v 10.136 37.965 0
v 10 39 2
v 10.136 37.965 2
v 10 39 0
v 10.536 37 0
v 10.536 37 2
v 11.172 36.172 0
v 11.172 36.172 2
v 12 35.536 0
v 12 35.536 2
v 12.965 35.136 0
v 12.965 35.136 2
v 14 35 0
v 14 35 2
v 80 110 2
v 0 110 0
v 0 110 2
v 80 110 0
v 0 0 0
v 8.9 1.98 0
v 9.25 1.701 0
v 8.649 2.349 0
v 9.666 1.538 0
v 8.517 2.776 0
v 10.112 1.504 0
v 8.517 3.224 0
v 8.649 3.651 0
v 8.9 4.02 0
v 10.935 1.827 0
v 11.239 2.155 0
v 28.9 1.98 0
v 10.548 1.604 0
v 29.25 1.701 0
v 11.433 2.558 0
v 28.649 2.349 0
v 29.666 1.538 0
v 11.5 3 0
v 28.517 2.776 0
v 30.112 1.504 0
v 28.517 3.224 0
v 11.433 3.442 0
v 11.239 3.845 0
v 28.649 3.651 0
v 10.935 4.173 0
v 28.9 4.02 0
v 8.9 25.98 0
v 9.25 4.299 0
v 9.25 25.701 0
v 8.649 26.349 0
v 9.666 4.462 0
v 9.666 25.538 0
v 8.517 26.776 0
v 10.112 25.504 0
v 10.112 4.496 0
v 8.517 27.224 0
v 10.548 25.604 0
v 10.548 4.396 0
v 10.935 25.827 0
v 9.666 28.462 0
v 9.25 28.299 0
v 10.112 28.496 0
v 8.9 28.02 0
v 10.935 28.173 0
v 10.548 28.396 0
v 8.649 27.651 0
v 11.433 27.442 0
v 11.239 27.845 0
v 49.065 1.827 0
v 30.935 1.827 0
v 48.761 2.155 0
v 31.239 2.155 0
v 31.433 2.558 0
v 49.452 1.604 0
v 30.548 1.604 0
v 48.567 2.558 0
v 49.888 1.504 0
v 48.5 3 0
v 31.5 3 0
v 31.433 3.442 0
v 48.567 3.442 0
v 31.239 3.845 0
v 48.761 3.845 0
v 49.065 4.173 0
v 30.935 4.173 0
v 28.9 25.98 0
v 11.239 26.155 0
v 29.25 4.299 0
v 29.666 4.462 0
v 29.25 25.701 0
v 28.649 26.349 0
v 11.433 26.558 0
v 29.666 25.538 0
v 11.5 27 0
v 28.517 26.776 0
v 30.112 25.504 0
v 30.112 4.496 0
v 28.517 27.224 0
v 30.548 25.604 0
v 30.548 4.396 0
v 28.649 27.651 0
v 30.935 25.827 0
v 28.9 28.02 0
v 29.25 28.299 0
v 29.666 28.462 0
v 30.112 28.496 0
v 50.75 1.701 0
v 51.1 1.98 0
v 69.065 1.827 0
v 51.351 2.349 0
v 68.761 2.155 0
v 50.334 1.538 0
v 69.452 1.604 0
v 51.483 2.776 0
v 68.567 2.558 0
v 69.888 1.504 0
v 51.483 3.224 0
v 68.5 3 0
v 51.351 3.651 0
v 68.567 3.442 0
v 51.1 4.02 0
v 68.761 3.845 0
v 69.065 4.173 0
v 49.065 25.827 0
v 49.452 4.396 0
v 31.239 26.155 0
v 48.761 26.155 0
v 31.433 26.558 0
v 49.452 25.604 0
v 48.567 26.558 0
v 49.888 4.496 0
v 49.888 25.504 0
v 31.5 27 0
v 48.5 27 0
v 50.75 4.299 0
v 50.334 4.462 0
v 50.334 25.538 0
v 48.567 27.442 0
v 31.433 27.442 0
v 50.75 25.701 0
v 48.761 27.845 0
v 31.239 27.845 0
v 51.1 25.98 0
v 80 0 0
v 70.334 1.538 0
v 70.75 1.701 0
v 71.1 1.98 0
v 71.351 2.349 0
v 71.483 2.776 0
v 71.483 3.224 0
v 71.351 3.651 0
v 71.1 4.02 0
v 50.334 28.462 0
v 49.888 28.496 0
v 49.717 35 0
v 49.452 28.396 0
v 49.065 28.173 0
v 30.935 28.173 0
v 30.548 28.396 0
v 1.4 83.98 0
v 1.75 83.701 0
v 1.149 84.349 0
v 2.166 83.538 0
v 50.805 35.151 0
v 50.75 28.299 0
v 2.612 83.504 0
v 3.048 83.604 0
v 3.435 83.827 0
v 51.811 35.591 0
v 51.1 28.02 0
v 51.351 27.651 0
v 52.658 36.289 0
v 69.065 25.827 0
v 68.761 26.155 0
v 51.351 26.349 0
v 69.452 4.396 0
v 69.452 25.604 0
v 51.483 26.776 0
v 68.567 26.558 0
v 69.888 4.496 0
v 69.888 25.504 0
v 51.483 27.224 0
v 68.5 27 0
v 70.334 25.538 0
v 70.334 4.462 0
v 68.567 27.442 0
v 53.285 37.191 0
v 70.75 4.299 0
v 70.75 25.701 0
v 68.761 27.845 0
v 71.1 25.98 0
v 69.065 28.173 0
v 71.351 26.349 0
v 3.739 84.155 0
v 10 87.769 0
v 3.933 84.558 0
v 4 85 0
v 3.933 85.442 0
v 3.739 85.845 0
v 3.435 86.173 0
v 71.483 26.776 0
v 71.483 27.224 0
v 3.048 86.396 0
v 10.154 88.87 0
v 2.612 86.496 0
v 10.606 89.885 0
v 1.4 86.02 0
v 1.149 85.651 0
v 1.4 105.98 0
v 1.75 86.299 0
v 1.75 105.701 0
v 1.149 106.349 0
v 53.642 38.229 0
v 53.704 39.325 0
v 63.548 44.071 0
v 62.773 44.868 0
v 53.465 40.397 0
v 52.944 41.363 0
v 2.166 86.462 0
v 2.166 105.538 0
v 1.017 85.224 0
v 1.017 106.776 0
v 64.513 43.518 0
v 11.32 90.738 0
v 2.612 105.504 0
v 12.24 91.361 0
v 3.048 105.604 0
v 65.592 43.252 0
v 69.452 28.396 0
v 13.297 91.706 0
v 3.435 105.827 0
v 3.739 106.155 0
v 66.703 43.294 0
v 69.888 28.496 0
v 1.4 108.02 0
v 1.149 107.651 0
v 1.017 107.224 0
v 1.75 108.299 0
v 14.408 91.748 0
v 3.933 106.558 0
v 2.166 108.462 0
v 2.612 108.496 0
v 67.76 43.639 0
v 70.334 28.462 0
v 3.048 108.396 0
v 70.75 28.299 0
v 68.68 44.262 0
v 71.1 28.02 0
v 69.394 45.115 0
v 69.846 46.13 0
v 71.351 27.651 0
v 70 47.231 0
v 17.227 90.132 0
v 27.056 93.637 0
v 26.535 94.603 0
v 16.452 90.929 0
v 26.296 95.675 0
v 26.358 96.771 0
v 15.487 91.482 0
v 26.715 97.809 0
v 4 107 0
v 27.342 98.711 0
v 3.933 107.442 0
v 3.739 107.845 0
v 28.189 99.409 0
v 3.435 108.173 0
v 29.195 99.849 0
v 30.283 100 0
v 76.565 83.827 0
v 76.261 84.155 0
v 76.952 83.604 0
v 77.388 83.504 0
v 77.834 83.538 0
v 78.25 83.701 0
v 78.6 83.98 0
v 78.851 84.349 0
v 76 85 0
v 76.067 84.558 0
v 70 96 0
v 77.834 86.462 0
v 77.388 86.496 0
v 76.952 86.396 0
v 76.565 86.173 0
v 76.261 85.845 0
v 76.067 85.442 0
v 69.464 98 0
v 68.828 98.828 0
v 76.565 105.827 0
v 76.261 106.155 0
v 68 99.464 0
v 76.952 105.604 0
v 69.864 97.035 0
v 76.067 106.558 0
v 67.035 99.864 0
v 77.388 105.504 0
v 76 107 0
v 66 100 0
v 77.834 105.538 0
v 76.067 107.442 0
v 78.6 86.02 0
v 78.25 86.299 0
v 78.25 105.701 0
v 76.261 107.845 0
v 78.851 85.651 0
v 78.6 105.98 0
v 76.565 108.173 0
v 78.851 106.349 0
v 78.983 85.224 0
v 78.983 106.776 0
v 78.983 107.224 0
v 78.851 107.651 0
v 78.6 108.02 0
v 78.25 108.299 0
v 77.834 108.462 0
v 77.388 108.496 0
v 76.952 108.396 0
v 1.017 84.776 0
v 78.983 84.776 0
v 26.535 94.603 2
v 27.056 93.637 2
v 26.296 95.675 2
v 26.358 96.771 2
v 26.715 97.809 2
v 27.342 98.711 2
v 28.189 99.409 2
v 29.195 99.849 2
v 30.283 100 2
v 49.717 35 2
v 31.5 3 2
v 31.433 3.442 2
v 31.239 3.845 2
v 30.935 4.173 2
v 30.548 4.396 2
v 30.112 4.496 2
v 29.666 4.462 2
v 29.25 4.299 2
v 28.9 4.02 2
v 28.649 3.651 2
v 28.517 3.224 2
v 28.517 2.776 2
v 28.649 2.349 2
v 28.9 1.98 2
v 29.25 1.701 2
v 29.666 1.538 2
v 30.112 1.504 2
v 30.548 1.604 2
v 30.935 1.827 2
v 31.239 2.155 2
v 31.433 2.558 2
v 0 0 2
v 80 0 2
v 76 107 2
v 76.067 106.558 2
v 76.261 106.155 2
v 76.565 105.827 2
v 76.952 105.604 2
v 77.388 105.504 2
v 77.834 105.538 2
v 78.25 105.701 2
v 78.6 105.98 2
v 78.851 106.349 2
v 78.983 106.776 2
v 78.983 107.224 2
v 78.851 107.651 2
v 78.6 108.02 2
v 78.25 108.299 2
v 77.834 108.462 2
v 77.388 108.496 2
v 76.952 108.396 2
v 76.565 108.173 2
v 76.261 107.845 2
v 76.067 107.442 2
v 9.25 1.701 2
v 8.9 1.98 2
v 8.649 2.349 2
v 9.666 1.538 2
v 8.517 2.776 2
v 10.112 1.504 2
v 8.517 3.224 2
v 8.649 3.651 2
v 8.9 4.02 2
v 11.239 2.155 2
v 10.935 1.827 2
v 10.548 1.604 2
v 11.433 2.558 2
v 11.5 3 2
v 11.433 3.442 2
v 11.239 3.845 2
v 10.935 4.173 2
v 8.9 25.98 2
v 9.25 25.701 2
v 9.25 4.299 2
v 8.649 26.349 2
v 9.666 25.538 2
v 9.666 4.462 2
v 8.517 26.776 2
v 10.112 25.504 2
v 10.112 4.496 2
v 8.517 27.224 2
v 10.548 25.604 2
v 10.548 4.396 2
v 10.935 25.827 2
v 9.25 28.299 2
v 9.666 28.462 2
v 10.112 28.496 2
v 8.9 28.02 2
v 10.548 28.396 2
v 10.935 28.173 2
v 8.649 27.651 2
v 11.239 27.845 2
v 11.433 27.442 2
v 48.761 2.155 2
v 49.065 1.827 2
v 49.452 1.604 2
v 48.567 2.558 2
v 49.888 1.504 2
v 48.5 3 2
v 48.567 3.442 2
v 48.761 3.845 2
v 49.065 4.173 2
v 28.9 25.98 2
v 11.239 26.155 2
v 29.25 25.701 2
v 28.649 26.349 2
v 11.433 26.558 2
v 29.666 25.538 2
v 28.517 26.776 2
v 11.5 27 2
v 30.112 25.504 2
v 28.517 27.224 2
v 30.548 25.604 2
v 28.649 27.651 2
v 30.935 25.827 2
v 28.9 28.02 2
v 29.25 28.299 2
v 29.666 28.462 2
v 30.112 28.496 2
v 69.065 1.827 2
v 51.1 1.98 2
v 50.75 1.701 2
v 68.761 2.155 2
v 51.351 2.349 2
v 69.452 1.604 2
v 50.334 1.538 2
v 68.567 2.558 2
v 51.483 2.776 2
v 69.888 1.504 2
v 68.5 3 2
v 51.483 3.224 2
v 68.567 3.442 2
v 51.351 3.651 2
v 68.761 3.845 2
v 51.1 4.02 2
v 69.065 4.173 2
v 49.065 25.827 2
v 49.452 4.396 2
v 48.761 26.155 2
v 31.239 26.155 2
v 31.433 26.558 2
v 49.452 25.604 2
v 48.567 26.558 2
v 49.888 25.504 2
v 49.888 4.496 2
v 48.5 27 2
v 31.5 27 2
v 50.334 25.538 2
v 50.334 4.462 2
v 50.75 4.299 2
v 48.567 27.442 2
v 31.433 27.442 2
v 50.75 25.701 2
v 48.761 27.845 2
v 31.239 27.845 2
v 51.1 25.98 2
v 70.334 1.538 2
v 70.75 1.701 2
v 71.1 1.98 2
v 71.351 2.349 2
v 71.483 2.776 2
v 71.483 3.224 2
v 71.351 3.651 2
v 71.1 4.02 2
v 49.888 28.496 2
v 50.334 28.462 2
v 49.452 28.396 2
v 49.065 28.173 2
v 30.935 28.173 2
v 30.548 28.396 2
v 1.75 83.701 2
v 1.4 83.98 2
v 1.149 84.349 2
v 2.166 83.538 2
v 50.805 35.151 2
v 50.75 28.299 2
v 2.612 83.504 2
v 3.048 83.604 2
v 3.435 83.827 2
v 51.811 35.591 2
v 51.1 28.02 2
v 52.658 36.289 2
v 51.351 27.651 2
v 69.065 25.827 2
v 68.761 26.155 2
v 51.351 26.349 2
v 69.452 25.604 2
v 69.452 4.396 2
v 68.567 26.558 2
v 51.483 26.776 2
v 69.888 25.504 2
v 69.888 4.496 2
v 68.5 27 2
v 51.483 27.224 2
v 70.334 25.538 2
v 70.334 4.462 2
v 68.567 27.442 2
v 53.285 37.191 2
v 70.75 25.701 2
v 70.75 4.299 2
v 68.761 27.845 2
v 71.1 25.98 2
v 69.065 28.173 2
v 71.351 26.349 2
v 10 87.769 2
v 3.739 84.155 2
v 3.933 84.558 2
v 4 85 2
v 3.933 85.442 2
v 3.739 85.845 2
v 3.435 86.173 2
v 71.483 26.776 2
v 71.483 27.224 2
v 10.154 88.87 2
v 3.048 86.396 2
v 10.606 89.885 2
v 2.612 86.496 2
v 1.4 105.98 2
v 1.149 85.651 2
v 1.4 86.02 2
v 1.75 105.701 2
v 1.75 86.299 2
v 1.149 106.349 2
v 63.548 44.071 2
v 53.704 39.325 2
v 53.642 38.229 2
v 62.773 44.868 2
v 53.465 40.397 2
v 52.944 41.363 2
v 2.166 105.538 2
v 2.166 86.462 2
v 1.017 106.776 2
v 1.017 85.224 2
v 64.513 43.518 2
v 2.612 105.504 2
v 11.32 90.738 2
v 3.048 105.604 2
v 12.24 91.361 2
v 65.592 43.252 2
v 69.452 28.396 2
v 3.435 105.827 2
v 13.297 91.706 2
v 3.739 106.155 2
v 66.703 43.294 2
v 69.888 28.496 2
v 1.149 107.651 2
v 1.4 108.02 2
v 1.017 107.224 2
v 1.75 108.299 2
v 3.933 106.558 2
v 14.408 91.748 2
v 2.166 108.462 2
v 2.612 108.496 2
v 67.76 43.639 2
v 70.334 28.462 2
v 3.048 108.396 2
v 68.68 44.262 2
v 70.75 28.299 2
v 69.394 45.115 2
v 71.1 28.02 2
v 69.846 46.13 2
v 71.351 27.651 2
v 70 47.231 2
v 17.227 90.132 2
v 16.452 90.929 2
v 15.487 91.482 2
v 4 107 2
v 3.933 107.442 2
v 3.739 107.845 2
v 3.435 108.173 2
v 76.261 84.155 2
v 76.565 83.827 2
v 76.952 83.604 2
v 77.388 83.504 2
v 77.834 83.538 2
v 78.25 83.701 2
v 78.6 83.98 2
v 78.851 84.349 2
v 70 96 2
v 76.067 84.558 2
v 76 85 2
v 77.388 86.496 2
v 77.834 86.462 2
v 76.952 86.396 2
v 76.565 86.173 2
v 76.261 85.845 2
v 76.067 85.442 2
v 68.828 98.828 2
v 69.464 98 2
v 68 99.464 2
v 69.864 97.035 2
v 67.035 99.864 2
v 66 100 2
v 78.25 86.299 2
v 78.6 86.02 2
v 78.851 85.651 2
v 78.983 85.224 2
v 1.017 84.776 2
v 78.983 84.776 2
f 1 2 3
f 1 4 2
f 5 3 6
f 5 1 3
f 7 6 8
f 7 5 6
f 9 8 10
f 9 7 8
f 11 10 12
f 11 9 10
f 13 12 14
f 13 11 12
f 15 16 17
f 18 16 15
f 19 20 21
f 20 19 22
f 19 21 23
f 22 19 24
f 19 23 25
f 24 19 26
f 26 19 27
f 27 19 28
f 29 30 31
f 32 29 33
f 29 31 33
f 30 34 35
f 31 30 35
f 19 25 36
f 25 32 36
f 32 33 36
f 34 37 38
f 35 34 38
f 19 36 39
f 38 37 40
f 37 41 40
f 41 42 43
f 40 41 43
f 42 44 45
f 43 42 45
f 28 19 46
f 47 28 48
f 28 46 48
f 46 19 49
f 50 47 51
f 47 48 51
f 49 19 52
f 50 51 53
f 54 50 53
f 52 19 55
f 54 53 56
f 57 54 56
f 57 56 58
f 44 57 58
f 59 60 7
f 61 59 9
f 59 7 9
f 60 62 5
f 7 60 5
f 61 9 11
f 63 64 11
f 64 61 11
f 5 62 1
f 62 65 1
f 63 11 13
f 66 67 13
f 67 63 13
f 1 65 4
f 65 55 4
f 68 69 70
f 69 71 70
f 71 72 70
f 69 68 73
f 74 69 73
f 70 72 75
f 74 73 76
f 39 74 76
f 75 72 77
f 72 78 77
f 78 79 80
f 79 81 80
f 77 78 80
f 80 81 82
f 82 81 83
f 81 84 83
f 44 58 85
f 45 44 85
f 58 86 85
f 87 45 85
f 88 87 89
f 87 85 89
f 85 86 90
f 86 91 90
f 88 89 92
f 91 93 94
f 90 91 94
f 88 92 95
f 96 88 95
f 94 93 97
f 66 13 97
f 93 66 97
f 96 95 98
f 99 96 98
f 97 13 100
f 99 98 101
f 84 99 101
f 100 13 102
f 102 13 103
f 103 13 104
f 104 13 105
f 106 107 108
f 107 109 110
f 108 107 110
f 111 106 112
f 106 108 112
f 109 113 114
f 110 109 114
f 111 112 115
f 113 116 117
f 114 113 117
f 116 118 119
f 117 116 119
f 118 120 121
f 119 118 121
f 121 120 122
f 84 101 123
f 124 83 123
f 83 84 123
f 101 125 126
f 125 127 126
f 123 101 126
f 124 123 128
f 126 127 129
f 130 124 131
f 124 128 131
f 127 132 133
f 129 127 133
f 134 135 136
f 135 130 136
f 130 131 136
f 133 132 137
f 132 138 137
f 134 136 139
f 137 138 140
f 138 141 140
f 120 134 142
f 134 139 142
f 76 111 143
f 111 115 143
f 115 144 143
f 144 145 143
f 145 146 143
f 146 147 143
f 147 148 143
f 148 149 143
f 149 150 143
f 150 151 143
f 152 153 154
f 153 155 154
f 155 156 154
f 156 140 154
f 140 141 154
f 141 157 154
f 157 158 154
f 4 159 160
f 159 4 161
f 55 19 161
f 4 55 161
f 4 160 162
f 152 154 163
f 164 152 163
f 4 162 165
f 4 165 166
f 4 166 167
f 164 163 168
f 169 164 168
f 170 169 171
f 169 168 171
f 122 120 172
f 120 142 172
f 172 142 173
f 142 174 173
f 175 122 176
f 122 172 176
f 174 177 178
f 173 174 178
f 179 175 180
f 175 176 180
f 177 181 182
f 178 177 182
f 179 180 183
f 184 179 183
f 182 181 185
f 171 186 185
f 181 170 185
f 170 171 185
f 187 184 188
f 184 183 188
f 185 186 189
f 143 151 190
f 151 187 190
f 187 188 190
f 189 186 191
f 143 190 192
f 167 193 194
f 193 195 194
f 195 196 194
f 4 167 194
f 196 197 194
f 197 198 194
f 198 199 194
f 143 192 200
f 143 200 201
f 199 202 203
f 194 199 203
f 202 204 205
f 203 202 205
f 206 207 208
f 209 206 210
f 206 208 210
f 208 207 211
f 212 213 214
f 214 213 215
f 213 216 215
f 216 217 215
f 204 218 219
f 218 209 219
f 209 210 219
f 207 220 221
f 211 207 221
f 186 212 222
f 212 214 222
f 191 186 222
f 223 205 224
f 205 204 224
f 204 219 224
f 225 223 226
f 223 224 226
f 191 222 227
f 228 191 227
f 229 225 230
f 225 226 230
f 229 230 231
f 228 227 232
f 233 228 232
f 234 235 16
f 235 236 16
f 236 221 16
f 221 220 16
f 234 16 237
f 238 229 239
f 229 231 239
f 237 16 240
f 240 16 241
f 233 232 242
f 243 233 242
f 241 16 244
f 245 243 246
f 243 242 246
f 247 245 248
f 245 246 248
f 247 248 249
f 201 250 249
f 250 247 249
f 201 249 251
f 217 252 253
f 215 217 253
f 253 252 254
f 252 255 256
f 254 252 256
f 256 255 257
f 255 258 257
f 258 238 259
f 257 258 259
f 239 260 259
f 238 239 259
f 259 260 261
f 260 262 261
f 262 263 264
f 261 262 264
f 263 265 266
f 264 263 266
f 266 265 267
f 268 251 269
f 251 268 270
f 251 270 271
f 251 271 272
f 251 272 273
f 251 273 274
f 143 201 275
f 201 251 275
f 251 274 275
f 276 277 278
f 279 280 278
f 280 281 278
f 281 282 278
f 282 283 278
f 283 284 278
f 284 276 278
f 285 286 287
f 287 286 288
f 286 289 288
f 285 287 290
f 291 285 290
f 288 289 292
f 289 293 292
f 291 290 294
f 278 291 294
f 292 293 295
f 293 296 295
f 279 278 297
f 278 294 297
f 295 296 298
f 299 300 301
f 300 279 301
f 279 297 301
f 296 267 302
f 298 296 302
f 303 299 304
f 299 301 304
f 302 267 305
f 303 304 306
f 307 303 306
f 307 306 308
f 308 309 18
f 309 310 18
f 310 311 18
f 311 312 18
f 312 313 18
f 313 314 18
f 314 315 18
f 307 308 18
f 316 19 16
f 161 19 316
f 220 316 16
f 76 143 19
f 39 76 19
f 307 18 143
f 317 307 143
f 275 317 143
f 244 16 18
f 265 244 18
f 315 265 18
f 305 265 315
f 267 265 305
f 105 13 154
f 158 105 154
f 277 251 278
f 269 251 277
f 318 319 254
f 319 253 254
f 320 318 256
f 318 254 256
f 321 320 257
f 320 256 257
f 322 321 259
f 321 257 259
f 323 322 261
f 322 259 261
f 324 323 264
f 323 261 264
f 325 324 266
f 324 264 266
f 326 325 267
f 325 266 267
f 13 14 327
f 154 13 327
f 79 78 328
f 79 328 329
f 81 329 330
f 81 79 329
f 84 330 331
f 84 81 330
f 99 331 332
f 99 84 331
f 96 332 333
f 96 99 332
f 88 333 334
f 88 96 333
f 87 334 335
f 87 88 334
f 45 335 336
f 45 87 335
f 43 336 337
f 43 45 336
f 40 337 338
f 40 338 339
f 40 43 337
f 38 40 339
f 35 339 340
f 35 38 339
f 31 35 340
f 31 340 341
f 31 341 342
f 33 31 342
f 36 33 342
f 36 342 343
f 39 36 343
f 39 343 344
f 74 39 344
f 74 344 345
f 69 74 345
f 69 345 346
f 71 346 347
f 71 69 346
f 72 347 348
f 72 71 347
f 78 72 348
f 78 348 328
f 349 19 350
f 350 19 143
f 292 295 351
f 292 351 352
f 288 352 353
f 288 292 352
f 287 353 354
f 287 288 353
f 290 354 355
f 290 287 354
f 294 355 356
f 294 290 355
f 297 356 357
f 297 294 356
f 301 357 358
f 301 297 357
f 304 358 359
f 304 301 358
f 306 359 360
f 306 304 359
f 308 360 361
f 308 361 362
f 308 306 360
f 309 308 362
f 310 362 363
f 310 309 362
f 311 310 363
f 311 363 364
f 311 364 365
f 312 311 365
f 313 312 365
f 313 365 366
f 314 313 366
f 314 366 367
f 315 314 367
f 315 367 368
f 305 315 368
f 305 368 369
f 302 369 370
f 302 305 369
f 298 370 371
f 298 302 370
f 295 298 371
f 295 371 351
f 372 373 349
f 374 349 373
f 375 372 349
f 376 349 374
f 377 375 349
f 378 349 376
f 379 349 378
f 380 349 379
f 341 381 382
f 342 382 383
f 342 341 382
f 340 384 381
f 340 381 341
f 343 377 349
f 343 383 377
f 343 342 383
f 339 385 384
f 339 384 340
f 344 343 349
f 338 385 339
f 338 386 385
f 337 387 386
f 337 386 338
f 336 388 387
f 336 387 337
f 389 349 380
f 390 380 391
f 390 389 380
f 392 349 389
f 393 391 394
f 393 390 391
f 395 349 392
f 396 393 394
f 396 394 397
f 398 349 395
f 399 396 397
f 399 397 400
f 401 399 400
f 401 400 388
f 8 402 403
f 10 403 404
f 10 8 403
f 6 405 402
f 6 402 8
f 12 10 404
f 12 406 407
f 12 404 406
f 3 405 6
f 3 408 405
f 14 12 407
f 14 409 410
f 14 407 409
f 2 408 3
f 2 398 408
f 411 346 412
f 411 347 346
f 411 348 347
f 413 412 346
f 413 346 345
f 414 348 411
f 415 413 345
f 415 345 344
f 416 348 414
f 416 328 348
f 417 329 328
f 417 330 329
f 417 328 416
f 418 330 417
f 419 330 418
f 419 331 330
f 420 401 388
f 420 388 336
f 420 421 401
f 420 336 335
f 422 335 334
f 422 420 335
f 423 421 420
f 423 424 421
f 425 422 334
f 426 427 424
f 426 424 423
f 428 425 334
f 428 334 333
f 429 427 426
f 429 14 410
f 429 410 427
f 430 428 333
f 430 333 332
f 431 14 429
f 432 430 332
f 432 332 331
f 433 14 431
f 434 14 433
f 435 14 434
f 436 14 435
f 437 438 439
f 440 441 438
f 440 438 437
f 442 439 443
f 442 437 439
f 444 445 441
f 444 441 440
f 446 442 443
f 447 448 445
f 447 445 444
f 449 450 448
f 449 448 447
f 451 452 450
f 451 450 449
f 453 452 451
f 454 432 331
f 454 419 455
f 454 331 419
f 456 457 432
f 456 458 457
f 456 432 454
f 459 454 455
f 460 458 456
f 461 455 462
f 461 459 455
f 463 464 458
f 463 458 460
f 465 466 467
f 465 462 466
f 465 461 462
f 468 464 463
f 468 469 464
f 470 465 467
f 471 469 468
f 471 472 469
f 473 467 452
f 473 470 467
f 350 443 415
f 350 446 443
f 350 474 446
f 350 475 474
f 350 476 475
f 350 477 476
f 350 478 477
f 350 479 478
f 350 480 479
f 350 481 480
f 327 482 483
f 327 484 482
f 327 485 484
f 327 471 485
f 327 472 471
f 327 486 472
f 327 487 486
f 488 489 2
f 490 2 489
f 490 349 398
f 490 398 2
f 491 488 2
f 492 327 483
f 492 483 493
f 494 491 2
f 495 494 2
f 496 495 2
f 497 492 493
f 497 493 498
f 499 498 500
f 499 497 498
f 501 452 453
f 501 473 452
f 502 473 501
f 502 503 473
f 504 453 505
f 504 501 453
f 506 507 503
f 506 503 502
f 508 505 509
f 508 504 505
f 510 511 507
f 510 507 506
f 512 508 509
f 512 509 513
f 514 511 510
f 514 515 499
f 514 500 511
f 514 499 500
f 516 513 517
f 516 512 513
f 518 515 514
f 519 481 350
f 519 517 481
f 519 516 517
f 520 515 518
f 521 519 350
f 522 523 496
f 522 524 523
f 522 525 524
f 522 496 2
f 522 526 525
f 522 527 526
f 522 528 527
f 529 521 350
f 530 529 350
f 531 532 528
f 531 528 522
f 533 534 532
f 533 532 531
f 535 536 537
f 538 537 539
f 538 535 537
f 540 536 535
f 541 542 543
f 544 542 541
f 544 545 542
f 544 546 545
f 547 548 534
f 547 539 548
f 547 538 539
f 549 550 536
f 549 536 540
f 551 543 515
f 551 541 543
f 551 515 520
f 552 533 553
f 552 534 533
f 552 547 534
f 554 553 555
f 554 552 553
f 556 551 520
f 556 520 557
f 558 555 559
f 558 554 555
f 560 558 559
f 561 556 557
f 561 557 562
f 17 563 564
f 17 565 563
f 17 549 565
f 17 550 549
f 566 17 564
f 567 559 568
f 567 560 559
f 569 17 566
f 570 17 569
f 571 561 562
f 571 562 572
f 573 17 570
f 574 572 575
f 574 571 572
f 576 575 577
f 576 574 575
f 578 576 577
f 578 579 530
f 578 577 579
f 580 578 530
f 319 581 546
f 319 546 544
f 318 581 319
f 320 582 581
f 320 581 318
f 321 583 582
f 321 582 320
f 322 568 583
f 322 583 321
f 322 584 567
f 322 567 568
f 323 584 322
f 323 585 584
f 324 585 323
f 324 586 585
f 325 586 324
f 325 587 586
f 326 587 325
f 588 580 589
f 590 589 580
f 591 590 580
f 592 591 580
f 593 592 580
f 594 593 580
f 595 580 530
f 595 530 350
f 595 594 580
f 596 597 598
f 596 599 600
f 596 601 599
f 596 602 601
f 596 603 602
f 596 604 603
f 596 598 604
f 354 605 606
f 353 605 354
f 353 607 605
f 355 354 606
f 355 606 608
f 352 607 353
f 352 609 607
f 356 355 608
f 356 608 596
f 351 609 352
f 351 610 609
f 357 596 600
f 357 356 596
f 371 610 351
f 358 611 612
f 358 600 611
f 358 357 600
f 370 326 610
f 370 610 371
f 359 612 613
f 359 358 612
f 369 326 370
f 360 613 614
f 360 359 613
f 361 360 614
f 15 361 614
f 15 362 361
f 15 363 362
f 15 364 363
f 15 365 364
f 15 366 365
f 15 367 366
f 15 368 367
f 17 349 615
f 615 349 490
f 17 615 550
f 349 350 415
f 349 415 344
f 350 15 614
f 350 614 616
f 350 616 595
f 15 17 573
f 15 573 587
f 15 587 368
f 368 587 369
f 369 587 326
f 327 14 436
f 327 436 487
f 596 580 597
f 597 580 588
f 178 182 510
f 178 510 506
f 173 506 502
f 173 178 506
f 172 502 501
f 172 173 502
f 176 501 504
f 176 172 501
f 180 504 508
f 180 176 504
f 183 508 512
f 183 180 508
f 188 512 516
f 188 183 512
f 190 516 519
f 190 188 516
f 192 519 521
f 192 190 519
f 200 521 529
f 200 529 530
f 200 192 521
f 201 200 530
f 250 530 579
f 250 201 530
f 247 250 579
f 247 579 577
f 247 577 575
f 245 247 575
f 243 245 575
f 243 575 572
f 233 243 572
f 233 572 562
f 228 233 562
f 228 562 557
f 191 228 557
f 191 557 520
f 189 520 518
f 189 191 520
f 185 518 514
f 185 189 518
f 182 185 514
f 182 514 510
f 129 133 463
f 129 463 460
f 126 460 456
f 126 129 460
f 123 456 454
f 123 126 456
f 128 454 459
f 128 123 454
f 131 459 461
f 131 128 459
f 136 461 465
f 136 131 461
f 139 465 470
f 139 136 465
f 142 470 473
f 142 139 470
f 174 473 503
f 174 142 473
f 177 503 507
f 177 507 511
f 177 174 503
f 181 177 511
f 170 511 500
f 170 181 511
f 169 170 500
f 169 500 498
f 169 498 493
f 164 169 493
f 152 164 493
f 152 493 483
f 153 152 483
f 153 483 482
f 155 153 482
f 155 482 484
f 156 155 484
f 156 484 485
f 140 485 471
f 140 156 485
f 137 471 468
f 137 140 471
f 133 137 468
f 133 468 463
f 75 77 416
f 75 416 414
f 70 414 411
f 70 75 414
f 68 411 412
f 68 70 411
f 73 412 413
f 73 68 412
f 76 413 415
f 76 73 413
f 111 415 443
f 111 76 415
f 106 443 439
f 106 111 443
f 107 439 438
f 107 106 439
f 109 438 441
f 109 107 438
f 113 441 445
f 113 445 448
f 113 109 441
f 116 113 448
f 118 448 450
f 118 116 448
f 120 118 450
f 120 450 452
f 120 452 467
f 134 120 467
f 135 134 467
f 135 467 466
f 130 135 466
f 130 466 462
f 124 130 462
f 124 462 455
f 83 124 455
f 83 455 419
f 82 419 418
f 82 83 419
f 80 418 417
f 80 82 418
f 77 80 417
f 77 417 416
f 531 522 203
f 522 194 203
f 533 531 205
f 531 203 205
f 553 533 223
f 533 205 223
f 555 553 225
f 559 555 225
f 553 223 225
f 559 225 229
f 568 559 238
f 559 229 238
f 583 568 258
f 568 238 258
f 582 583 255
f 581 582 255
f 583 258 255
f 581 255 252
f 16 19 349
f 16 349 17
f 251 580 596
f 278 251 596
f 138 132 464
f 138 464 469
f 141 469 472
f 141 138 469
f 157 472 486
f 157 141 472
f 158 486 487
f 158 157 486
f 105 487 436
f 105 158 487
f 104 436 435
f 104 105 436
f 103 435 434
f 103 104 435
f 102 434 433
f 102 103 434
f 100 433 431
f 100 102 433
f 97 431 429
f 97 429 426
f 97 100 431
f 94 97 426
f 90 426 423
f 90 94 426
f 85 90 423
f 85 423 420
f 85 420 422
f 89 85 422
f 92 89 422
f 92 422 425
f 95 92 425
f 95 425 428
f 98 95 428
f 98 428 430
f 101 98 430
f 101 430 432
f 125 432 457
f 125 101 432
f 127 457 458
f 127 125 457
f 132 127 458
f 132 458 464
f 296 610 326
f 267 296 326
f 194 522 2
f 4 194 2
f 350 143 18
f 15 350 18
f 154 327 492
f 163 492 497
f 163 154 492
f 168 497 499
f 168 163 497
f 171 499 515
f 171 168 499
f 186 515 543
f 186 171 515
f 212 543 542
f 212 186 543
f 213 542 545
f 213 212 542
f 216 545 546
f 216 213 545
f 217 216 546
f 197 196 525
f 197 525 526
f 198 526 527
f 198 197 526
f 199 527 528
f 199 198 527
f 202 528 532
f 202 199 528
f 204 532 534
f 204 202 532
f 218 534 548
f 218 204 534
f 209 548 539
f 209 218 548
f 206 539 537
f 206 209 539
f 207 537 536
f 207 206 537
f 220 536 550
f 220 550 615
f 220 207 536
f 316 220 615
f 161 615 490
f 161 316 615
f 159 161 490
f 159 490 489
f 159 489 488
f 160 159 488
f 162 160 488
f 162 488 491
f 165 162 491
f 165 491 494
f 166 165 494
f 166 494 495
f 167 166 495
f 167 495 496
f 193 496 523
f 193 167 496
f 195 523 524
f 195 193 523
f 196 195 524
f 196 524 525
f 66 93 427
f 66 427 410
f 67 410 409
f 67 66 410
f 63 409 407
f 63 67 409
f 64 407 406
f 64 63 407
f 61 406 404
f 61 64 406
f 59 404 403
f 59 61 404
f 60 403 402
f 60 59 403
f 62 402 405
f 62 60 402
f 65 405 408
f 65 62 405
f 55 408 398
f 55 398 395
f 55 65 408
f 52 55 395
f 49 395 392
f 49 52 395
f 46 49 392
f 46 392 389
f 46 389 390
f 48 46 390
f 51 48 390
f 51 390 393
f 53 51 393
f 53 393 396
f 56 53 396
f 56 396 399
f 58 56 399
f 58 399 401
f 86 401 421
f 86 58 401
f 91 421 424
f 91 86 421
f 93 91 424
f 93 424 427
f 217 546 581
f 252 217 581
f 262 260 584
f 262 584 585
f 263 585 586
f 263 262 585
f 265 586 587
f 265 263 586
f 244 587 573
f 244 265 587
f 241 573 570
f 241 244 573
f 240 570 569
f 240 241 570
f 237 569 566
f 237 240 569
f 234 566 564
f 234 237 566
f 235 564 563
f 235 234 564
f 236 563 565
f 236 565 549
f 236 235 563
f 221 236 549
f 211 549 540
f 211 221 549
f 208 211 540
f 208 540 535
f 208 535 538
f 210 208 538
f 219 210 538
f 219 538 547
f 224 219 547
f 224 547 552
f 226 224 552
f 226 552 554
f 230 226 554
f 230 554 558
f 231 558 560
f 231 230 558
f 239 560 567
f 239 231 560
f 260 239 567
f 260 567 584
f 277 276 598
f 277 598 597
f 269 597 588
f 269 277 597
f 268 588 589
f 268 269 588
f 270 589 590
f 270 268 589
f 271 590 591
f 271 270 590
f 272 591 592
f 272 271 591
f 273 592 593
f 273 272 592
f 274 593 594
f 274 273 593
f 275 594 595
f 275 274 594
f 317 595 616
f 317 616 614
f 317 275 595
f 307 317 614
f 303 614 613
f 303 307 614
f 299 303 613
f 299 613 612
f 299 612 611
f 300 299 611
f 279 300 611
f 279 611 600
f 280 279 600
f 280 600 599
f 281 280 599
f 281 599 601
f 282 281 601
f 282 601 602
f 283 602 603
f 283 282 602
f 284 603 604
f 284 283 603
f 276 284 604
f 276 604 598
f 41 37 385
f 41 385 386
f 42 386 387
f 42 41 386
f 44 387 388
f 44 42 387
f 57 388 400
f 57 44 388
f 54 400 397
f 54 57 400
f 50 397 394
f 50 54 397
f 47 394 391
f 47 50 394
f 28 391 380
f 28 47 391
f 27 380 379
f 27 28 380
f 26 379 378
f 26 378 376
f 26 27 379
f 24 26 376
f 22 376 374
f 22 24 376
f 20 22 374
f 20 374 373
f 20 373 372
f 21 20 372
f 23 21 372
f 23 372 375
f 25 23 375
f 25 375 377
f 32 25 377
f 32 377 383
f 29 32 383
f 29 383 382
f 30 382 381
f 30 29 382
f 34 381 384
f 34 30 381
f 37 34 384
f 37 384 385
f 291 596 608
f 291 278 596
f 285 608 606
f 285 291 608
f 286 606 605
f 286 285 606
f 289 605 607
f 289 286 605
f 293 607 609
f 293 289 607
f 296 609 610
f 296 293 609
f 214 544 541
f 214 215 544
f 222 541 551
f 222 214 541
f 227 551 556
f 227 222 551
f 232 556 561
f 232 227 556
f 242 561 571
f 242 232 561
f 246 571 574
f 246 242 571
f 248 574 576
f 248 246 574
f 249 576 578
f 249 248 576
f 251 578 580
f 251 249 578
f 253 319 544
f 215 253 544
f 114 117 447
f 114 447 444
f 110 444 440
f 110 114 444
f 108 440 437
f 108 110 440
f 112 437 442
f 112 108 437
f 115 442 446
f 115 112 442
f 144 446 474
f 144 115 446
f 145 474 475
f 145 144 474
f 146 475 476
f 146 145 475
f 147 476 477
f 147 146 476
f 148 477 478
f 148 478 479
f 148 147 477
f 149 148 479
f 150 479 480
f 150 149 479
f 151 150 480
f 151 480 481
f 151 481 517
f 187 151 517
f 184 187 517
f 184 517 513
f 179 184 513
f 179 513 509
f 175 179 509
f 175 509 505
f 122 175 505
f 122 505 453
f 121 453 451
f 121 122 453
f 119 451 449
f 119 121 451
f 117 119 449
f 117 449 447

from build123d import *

# Parameters (mm, degrees)
SKETCH_1_W          = 80
SKETCH_1_H          = 110
SKETCH_1_R          = 1.5
EXTRUDE_1_DEPTH     = 2
CUT_EXTRUDE_1_DEPTH = 10
FILLET_1_R          = 4


with BuildPart() as part:
    # 草图1 → 凸台-拉伸1 (new body)
    with BuildSketch(Plane.XY):
        with Locations((40, 55)):
            Rectangle(SKETCH_1_W, SKETCH_1_H)
        with Locations((10, 3)):
            Circle(SKETCH_1_R, mode=Mode.SUBTRACT)
        with Locations((30, 3)):
            Circle(SKETCH_1_R, mode=Mode.SUBTRACT)
        with Locations(Location((50, 3, 0), (0, 0, 180))):
            Circle(SKETCH_1_R, mode=Mode.SUBTRACT)
        with Locations(Location((70, 3, 0), (0, 0, 180))):
            Circle(SKETCH_1_R, mode=Mode.SUBTRACT)
        with Locations((2.5, 107)):
            Circle(SKETCH_1_R, mode=Mode.SUBTRACT)
        with Locations((2.5, 85)):
            Circle(SKETCH_1_R, mode=Mode.SUBTRACT)
        with Locations(Location((77.5, 85, 0), (0, 0, 180))):
            Circle(SKETCH_1_R, mode=Mode.SUBTRACT)
        with Locations(Location((77.5, 107, 0), (0, 0, 180))):
            Circle(SKETCH_1_R, mode=Mode.SUBTRACT)
        with Locations((10, 27)):
            Circle(SKETCH_1_R, mode=Mode.SUBTRACT)
        with Locations((30, 27)):
            Circle(SKETCH_1_R, mode=Mode.SUBTRACT)
        with Locations(Location((50, 27, 0), (0, 0, 180))):
            Circle(SKETCH_1_R, mode=Mode.SUBTRACT)
        with Locations(Location((70, 27, 0), (0, 0, 180))):
            Circle(SKETCH_1_R, mode=Mode.SUBTRACT)
    extrude(amount=EXTRUDE_1_DEPTH)

    # 草图3 → 切除-拉伸1 (cut)
    with BuildSketch(Plane.XY.offset(2)):
        Polygon((10, 100), (10, 35), (57.604900254, 35), align=None)
        Polygon((22.395099746, 100), (70, 35), (70, 100), align=None)
    extrude(amount=-CUT_EXTRUDE_1_DEPTH, mode=Mode.SUBTRACT)

    # 圆角1
    fillet_1_edges = [part.edges().sort_by_distance(p)[0] for p in [
        (22.395099746, 100, 1),
        (70, 100, 1),
        (70, 35, 1),
        (10, 100, 1),
        (57.604900254, 35, 1),
        (10, 35, 1),
    ]]
    fillet(fillet_1_edges, radius=FILLET_1_R)


solid = part.part
